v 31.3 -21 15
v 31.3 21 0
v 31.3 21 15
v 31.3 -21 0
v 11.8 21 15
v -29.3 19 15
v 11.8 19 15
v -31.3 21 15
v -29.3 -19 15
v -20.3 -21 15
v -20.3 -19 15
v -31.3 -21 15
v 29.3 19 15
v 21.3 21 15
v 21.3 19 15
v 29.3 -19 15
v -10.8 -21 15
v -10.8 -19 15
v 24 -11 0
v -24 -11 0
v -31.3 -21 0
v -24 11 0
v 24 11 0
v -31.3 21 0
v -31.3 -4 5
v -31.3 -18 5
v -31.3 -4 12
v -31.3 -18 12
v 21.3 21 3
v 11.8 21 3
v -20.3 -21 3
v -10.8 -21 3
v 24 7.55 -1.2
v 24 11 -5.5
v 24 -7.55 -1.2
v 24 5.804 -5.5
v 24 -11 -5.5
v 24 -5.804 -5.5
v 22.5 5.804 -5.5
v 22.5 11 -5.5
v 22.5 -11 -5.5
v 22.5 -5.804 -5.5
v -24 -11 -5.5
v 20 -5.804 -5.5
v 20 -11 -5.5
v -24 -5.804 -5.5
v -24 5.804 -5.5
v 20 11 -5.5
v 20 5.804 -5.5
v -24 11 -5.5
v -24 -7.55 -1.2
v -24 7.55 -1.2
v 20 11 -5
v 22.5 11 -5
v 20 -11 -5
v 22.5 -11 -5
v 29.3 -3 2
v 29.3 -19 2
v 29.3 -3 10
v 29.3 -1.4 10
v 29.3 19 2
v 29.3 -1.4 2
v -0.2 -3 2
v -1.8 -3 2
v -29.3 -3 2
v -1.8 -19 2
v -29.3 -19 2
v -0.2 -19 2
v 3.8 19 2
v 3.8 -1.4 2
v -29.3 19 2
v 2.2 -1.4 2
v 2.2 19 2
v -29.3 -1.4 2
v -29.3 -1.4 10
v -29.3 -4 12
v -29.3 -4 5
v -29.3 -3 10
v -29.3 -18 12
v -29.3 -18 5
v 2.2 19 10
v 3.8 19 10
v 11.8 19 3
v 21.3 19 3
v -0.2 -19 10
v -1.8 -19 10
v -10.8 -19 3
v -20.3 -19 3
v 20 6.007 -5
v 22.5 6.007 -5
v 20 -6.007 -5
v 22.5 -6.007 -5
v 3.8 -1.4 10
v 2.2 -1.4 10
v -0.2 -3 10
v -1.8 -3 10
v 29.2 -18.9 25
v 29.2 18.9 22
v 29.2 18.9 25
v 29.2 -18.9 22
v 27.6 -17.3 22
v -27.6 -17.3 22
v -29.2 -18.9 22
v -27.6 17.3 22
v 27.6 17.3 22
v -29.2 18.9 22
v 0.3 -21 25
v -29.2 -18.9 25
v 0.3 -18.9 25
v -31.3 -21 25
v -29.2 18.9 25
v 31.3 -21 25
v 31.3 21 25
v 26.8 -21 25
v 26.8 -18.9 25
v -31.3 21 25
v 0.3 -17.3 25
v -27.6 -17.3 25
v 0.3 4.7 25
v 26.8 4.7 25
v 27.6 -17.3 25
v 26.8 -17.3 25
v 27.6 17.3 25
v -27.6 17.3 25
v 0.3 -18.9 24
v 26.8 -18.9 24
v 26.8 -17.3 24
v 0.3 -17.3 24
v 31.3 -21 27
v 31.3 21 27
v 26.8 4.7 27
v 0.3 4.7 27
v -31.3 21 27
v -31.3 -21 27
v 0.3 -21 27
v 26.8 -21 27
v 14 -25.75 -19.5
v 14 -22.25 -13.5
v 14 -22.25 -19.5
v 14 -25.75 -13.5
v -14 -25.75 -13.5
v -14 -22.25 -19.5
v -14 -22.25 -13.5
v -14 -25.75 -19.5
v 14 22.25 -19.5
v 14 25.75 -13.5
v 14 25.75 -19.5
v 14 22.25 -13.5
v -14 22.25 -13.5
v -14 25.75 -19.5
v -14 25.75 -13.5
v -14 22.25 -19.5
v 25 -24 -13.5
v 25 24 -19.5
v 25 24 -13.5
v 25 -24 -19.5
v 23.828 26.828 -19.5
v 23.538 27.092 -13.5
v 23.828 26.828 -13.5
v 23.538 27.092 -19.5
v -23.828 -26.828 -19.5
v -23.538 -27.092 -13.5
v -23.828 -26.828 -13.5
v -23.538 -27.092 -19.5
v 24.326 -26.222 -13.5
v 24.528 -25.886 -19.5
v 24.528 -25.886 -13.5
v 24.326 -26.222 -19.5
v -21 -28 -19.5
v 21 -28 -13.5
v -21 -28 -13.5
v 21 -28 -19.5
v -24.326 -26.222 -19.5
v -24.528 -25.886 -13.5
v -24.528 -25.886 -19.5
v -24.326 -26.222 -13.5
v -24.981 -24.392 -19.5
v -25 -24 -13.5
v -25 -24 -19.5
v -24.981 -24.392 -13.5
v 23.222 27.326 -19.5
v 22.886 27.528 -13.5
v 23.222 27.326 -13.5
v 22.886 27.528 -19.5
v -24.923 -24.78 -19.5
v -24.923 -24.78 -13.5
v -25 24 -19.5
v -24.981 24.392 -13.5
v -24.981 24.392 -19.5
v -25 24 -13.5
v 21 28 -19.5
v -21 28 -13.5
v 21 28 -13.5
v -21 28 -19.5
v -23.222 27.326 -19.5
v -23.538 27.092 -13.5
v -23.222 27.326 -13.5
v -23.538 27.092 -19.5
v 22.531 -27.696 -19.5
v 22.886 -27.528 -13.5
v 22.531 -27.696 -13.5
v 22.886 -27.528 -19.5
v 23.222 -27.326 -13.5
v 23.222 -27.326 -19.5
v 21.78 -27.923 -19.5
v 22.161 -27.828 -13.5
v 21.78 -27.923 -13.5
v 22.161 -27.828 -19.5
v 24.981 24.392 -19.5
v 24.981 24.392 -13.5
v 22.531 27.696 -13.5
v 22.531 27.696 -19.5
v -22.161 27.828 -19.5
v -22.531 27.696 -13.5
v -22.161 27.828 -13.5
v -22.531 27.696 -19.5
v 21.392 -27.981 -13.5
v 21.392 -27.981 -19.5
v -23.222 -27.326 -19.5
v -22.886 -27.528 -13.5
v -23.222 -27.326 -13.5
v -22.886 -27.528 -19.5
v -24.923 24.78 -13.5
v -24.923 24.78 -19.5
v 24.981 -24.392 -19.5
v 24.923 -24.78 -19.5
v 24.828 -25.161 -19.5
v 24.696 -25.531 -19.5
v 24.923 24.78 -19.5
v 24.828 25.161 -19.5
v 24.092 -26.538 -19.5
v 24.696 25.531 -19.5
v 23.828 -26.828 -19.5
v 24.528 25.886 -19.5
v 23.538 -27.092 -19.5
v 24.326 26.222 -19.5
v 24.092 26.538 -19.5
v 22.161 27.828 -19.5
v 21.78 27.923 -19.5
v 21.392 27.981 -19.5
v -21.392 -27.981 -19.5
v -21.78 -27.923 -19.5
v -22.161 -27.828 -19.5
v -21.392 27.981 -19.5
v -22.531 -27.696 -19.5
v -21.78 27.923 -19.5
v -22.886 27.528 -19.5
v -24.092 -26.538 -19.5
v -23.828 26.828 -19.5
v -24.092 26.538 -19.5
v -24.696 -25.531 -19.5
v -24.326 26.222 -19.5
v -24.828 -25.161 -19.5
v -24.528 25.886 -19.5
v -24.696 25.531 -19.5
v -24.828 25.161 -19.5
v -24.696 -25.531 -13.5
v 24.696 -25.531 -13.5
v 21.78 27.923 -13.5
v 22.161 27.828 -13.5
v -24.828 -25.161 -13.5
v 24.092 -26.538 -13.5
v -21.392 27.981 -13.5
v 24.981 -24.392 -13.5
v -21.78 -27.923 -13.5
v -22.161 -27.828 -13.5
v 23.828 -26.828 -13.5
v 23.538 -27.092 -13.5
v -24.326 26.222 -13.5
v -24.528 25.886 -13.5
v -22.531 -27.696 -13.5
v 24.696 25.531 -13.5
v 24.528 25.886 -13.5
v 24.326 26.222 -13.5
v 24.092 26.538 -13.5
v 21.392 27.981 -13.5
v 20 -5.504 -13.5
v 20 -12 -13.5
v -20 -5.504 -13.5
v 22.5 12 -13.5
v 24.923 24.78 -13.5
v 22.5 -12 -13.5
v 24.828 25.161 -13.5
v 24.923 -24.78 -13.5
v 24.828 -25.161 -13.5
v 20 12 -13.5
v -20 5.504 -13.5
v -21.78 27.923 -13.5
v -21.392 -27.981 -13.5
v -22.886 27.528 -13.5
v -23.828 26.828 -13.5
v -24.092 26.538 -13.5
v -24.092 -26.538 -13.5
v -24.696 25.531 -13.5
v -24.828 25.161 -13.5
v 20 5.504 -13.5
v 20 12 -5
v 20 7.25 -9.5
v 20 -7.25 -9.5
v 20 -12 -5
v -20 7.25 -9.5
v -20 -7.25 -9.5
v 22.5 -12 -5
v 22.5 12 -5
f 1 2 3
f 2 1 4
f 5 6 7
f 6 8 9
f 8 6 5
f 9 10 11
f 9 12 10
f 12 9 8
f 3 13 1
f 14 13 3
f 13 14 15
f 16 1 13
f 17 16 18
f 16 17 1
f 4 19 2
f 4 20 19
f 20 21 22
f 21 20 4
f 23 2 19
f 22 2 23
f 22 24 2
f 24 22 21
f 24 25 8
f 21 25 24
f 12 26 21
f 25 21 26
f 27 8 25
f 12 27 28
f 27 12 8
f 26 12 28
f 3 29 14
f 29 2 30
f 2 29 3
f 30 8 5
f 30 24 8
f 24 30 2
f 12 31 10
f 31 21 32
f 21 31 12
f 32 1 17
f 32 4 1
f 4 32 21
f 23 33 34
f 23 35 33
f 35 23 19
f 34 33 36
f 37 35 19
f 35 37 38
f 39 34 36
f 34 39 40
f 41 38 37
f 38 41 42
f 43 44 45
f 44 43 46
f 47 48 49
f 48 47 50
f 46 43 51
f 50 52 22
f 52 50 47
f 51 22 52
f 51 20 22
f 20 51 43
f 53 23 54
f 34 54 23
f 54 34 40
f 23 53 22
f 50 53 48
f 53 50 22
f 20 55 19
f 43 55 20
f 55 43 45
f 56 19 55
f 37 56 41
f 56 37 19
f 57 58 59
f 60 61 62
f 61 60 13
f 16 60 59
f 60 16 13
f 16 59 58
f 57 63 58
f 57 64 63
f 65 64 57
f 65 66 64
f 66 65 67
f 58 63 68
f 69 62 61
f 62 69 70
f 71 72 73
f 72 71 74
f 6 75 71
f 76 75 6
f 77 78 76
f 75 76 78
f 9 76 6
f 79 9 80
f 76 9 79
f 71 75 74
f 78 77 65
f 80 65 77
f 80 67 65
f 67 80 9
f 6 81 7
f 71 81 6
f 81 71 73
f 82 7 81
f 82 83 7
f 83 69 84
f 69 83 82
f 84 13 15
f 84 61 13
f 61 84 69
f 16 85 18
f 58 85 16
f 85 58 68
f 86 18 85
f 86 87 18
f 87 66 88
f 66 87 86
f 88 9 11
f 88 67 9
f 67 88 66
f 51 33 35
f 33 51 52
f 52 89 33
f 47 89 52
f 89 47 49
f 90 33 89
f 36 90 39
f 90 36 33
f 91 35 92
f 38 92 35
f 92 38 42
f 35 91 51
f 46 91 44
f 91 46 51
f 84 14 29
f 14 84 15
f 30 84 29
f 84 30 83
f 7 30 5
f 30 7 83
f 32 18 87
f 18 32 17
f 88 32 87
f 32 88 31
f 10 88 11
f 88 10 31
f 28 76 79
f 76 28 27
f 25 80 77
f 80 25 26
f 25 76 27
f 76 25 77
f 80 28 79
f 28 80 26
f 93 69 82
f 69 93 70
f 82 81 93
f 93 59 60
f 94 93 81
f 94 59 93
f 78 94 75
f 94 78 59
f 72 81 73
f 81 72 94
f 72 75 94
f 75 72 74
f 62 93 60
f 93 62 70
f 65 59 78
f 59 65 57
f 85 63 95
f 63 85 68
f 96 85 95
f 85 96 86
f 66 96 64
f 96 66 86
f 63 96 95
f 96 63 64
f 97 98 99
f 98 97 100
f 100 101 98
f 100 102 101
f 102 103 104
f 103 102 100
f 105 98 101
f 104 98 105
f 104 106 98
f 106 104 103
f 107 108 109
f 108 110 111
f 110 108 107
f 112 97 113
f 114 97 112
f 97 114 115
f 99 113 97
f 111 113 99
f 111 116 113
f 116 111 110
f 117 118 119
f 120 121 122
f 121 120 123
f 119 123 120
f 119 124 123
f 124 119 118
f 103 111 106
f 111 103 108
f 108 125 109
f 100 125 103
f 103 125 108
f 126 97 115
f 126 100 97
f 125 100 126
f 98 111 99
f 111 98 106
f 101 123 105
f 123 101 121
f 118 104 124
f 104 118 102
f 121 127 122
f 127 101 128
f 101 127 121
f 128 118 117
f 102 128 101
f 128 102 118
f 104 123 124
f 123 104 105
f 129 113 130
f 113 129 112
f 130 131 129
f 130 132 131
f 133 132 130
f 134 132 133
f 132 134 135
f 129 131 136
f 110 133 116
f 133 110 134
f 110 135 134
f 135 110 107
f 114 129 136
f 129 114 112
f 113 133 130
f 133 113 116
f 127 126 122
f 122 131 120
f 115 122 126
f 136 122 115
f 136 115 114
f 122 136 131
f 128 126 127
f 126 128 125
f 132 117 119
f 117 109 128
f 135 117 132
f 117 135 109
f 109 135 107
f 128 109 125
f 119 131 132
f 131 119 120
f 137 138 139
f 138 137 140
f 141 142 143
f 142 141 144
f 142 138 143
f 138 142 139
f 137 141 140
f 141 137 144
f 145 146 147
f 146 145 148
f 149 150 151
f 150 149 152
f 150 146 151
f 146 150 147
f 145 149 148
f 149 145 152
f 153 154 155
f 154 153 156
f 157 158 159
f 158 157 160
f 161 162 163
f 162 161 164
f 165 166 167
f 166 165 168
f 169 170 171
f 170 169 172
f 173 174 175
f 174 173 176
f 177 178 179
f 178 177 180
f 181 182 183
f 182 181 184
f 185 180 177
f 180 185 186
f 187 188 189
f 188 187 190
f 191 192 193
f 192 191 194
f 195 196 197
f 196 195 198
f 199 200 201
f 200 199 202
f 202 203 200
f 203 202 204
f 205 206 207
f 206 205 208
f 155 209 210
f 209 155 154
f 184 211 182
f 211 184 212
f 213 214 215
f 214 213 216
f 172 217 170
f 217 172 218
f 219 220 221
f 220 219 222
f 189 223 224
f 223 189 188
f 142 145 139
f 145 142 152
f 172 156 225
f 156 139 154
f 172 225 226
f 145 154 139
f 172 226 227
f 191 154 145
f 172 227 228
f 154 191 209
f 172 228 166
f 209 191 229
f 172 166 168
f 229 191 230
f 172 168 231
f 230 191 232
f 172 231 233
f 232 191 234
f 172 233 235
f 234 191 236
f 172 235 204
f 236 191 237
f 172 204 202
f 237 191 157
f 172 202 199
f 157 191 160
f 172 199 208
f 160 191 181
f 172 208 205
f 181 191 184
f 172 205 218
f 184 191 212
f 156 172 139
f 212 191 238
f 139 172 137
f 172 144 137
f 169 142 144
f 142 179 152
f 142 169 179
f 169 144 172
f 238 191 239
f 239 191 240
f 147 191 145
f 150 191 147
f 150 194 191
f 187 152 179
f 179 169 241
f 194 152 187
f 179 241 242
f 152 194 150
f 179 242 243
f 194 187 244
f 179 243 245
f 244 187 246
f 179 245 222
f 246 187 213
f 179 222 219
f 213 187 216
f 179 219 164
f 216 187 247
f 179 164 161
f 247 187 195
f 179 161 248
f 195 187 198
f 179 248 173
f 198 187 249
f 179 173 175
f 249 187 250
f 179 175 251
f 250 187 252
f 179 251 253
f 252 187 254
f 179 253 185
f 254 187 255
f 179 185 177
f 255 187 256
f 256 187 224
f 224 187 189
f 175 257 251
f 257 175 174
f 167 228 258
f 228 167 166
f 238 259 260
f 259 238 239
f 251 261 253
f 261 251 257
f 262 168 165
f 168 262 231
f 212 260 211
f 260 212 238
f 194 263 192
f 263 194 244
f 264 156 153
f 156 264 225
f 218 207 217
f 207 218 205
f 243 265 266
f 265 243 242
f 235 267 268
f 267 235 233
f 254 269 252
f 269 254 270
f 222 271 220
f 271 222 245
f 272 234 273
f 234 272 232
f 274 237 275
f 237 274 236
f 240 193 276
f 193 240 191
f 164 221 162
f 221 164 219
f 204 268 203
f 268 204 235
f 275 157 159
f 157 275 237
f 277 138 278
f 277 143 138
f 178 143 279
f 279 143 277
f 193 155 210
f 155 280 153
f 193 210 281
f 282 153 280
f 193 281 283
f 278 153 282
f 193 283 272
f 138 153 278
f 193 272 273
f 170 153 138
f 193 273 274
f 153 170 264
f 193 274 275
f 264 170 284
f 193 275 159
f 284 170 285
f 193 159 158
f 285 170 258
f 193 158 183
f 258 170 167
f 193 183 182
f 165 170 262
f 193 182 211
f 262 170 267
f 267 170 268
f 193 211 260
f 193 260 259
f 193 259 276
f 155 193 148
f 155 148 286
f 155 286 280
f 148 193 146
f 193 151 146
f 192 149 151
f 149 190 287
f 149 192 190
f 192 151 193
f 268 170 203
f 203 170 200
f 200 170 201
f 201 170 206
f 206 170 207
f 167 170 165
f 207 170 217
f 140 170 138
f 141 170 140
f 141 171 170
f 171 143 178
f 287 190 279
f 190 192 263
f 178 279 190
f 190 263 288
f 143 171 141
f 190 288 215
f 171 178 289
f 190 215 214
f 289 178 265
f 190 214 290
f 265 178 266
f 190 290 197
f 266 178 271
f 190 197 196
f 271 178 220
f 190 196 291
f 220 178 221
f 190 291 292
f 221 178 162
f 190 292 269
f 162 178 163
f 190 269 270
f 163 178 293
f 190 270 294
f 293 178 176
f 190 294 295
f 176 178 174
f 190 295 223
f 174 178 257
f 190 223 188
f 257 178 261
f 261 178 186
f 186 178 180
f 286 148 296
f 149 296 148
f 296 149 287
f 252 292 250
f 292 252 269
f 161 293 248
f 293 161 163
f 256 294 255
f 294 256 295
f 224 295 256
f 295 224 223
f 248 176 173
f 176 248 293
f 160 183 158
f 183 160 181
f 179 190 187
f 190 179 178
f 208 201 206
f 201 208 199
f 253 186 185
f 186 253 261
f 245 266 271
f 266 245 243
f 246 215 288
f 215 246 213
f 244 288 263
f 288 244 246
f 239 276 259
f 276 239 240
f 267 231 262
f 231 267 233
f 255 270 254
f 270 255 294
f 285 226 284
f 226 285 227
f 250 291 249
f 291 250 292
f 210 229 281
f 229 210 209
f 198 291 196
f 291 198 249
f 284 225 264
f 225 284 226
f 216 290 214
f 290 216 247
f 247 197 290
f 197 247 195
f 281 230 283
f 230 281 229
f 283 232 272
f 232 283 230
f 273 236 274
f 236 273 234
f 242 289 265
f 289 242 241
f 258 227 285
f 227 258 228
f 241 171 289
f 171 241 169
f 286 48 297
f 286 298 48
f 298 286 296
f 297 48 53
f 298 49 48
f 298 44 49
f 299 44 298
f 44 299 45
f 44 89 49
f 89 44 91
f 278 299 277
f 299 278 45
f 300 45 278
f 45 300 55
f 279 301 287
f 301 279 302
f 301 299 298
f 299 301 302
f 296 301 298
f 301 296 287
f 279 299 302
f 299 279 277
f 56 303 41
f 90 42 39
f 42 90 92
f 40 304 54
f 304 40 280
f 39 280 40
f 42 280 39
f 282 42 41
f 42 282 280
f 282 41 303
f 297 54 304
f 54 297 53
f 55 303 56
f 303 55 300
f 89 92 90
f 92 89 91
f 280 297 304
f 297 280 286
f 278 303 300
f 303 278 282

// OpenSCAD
// ============================================================
// Modular sports motion sensor - enclosure and mount system
// ============================================================
// Parts:
//   case         - electronics tray with dovetail groove underneath
//   lid          - friction-fit lid with OLED window
//   wrist_mount  - strap plate with dovetail rail
//   racket_mount - handle saddle with dovetail rail + zip-tie tunnels
//   fit_test     - 10-minute print to dial in printer tolerance
//
// All component dimensions below are taken from real caliper
// measurements of the actual parts used in this build.
//
// HOW TO USE
//   1. Set `part` below, press F6 (render), then export STL (F7).
//   2. PRINT fit_test FIRST. Rail should slide into the groove
//      snugly by hand. Too tight -> raise `fit` by 0.1, re-export.
//
// PRINT SETTINGS
//   PLA or PETG, 0.2 mm layers, 3 perimeters, 20% infill.
//   Case: floor down. Lid: flat side down. Mounts: rail up.
//   No supports needed on any part.
// ============================================================

part = "assembly"; // ["case","lid","wrist_mount","racket_mount","end_clip","fit_test","assembly"]

// ---------- global ----------
fit    = 0.30;   // mating clearance; tune with fit_test
wall   = 2.0;
divth  = 1.6;    // internal divider thickness
floorh = 2.0;
inh    = 13.0;   // internal height (use 16 if header pins are soldered on)
$fn    = 64;

// ---------- component pockets (measured dimensions + clearance) ----------
bat_l = 31.5;  bat_w = 20.4;   // LiPo 31.0 x 19.7 x 7.3mm (measured)
esp_l = 25.5;  esp_w = 19.5;   // ESP32-C3: 18x22.6mm board, 24mm w/ USB-C, 4mm thick, no pins
mpu_l = 21.9;  mpu_w = 17.2;   // MPU6050: 19.9x15.2mm board, 3.4mm thick, wires
tp_l  = 27.5;  tp_w  = 16.0;   // TP4056 (HW-373): 25.5mm long incl. USB-C port, 14mm wide
usb_esp_w = 9.5;               // ESP32 USB-C notch (~9mm connector width)
usb_tp_w  = 9.5;               // TP4056 USB-C notch
sw_l  = 14.0;  sw_h  = 7.0;    // slide switch: 12.7mm long x 6.3mm tall body (pins excluded)

// ---------- derived interior ----------
in_l  = bat_l + divth + esp_l;   // back row: battery | ESP32
in_w  = bat_w + divth + tp_w;    // rows: back (battery/ESP) | front (TP/MPU)
out_l = in_l + 2*wall;
out_w = in_w + 2*wall;
out_h = inh + floorh;

// ---------- lid ----------
lid_th = 2.0;  lip_h = 3.0;
lid_fit = 0.10;   // separate, TIGHTER clearance for the lid press-fit (not the same as the dovetail slide-fit)
clip_fit = 0.05;  // separate, TIGHTEST clearance for the end clip - firm push in/pull out by hand, no glue, stays reusable
win_l = 26.5;  win_w = 27.0;     // OLED window: 25.3x25.9mm board, 4mm thick (pins removed)
win_x =  (in_l/2 - bat_l/2);
win_y =  (in_w/2 - bat_w/2);

// ---------- dovetail ----------
dt_len  = 40;
dt_base = 11;
dt_top  = 14.5;
dt_h    = 4.0;
pad_l   = 48;  pad_w = 22;  pad_h = 5.5;
stop_th = 2.5;

// ---------- mounts ----------
wm_l = 50; wm_w = 56; wm_th = 6;   // widened so strap slots clear the case footprint (case is 42mm wide)
strap_w  = 26;                     // sized for a 25mm hook-and-loop cinch strap
rm_l = 45; rm_w = 38; rm_th = 15;
handle_d = 30;                     // handle across flats - verify against golf/racket grip
tie_w = 6;  tie_h = 2.5;

// ============================================================
module dovetail(len, extra = 0) {
    translate([-len/2, 0, 0])
        rotate([0, 90, 0])
            linear_extrude(len)
                polygon([[-0.01,        -(dt_base/2 + extra)],
                         [-0.01,         (dt_base/2 + extra)],
                         [dt_h + extra,  (dt_top/2  + extra)],
                         [dt_h + extra, -(dt_top/2  + extra)]]);
}

module rail_with_stop(z0, stop_height) {
    translate([0, 0, z0]) rotate([180, 0, 0]) dovetail(dt_len);
    translate([dt_len/2, -12, z0])
        cube([stop_th, 24, stop_height]);
}

module rounded_plate(l, w, t, r = 4) {
    hull()
        for (x = [-l/2 + r, l/2 - r], y = [-w/2 + r, w/2 - r])
            translate([x, y, 0]) cylinder(h = t, r = r);
}

// ============================================================
module case() {
    difference() {
        union() {
            translate([-out_l/2, -out_w/2, 0])
                cube([out_l, out_w, out_h]);
            translate([-pad_l/2, -pad_w/2, -pad_h])
                cube([pad_l, pad_w, pad_h]);
        }
        translate([-in_l/2, -in_w/2, floorh])
            cube([in_l, in_w, inh + 1]);
        translate([0, 0, -pad_h]) rotate([180, 0, 0])
            dovetail(pad_l + 2, fit);
        translate([in_l/2 - esp_l/2 - usb_esp_w/2, in_w/2 - 1, floorh + 1])
            cube([usb_esp_w, wall + 2, inh + 1]);
        translate([-in_l/2 + tp_l/2 - usb_tp_w/2, -in_w/2 - wall - 1, floorh + 1])
            cube([usb_tp_w, wall + 2, inh + 1]);
        translate([-in_l/2 - wall - 1, -in_w/2 + tp_w/2 - sw_l/2, floorh + 3])
            cube([wall + 2, sw_l, sw_h]);
    }
    divh = inh - 5;
    translate([-in_l/2 + bat_l, in_w/2 - bat_w, floorh])
        cube([divth, bat_w, divh]);
    translate([-in_l/2, in_w/2 - bat_w - divth, floorh])
        cube([in_l, divth, divh]);
    translate([-in_l/2 + tp_l, -in_w/2, floorh])
        cube([divth, tp_w, divh]);
}

// ============================================================
module lid() {
    difference() {
        union() {
            translate([-out_l/2, -out_w/2, 0])
                cube([out_l, out_w, lid_th]);
            translate([-(in_l - 2*lid_fit)/2, -(in_w - 2*lid_fit)/2, lid_th])
                difference() {
                    cube([in_l - 2*lid_fit, in_w - 2*lid_fit, lip_h]);
                    translate([1.6, 1.6, -1])
                        cube([in_l - 2*lid_fit - 3.2,
                              in_w - 2*lid_fit - 3.2, lip_h + 2]);
                }
        }
        translate([win_x - win_l/2, win_y - win_w/2, -1])
            cube([win_l, win_w, lid_th + 2]);
    }
}

// ============================================================
module wrist_mount() {
    difference() {
        rounded_plate(wm_l, wm_w, wm_th);
        for (sy = [-1, 1])
            translate([-(strap_w + 2)/2, sy*(wm_w/2 - 4) - 1.75, -1])
                cube([strap_w + 2, 3.5, wm_th + 2]);
    }
    rail_with_stop(wm_th, pad_h + 3);
}

// ============================================================
module racket_mount() {
    difference() {
        translate([-rm_l/2, -rm_w/2, 0]) cube([rm_l, rm_w, rm_th]);
        translate([0, 0, -handle_d/2 + 7.5])
            rotate([0, 90, 0])
                cylinder(h = rm_l + 2, d = handle_d + 1, center = true);
        for (tx = [-14, 14])
            translate([tx - tie_w/2, -rm_w/2 - 1, rm_th - 2.5 - tie_h])
                cube([tie_w, rm_w + 2, tie_h]);
    }
    rail_with_stop(rm_th, pad_h + 3);
}

// ============================================================

// ============================================================
// end_clip: a small plug that slides into the OPEN end of the
// rail after the case is mounted, physically blocking it from
// sliding off in that direction. Print one per mount. Push it
// into the groove with a firm push - it uses its own tight
// clip_fit tolerance (not the loose sliding `fit`), so it grips
// on its own. No glue - pull the tab to remove and reuse.
// ============================================================
module end_clip() {
    clip_len = 12;
    // oversized relative to nominal so it seats tightly (clip_fit clearance)
    // in a groove that was cut oversized by `fit` for the sliding case -
    // this is a firm push/pull fit, not a slide fit, and needs no glue.
    clip_extra = fit - clip_fit;
    translate([0, 0, dt_h]) rotate([180, 0, 0]) dovetail(clip_len, clip_extra);
    // small flat tab on top for grip when inserting/removing
    translate([-clip_len/2, -6, dt_h])
        cube([clip_len, 12, 3]);
}

module fit_test() {
    translate([0, 14, 0]) {
        translate([-15, -6, 0]) cube([30, 12, 3]);
        translate([0, 0, 3]) rotate([180, 0, 0]) dovetail(24);
    }
    translate([0, -14, 0]) difference() {
        translate([-15, -10, 0]) cube([30, 20, 8]);
        translate([0, 0, 8]) dovetail(32, fit);
    }
}

// ============================================================
module assembly() {
    color("lightsteelblue") case();
    color("lightsalmon")
        translate([0, 0, out_h + 10]) rotate([180, 0, 0])
            translate([0, 0, -lid_th]) lid();
    color("palegreen") translate([0, 0, -pad_h - wm_th - 8]) wrist_mount();
}

// ============================================================
if      (part == "case")         case();
else if (part == "lid")          lid();
else if (part == "wrist_mount")  wrist_mount();
else if (part == "racket_mount") racket_mount();
else if (part == "end_clip")     end_clip();
else if (part == "fit_test")     fit_test();
else                             assembly();
